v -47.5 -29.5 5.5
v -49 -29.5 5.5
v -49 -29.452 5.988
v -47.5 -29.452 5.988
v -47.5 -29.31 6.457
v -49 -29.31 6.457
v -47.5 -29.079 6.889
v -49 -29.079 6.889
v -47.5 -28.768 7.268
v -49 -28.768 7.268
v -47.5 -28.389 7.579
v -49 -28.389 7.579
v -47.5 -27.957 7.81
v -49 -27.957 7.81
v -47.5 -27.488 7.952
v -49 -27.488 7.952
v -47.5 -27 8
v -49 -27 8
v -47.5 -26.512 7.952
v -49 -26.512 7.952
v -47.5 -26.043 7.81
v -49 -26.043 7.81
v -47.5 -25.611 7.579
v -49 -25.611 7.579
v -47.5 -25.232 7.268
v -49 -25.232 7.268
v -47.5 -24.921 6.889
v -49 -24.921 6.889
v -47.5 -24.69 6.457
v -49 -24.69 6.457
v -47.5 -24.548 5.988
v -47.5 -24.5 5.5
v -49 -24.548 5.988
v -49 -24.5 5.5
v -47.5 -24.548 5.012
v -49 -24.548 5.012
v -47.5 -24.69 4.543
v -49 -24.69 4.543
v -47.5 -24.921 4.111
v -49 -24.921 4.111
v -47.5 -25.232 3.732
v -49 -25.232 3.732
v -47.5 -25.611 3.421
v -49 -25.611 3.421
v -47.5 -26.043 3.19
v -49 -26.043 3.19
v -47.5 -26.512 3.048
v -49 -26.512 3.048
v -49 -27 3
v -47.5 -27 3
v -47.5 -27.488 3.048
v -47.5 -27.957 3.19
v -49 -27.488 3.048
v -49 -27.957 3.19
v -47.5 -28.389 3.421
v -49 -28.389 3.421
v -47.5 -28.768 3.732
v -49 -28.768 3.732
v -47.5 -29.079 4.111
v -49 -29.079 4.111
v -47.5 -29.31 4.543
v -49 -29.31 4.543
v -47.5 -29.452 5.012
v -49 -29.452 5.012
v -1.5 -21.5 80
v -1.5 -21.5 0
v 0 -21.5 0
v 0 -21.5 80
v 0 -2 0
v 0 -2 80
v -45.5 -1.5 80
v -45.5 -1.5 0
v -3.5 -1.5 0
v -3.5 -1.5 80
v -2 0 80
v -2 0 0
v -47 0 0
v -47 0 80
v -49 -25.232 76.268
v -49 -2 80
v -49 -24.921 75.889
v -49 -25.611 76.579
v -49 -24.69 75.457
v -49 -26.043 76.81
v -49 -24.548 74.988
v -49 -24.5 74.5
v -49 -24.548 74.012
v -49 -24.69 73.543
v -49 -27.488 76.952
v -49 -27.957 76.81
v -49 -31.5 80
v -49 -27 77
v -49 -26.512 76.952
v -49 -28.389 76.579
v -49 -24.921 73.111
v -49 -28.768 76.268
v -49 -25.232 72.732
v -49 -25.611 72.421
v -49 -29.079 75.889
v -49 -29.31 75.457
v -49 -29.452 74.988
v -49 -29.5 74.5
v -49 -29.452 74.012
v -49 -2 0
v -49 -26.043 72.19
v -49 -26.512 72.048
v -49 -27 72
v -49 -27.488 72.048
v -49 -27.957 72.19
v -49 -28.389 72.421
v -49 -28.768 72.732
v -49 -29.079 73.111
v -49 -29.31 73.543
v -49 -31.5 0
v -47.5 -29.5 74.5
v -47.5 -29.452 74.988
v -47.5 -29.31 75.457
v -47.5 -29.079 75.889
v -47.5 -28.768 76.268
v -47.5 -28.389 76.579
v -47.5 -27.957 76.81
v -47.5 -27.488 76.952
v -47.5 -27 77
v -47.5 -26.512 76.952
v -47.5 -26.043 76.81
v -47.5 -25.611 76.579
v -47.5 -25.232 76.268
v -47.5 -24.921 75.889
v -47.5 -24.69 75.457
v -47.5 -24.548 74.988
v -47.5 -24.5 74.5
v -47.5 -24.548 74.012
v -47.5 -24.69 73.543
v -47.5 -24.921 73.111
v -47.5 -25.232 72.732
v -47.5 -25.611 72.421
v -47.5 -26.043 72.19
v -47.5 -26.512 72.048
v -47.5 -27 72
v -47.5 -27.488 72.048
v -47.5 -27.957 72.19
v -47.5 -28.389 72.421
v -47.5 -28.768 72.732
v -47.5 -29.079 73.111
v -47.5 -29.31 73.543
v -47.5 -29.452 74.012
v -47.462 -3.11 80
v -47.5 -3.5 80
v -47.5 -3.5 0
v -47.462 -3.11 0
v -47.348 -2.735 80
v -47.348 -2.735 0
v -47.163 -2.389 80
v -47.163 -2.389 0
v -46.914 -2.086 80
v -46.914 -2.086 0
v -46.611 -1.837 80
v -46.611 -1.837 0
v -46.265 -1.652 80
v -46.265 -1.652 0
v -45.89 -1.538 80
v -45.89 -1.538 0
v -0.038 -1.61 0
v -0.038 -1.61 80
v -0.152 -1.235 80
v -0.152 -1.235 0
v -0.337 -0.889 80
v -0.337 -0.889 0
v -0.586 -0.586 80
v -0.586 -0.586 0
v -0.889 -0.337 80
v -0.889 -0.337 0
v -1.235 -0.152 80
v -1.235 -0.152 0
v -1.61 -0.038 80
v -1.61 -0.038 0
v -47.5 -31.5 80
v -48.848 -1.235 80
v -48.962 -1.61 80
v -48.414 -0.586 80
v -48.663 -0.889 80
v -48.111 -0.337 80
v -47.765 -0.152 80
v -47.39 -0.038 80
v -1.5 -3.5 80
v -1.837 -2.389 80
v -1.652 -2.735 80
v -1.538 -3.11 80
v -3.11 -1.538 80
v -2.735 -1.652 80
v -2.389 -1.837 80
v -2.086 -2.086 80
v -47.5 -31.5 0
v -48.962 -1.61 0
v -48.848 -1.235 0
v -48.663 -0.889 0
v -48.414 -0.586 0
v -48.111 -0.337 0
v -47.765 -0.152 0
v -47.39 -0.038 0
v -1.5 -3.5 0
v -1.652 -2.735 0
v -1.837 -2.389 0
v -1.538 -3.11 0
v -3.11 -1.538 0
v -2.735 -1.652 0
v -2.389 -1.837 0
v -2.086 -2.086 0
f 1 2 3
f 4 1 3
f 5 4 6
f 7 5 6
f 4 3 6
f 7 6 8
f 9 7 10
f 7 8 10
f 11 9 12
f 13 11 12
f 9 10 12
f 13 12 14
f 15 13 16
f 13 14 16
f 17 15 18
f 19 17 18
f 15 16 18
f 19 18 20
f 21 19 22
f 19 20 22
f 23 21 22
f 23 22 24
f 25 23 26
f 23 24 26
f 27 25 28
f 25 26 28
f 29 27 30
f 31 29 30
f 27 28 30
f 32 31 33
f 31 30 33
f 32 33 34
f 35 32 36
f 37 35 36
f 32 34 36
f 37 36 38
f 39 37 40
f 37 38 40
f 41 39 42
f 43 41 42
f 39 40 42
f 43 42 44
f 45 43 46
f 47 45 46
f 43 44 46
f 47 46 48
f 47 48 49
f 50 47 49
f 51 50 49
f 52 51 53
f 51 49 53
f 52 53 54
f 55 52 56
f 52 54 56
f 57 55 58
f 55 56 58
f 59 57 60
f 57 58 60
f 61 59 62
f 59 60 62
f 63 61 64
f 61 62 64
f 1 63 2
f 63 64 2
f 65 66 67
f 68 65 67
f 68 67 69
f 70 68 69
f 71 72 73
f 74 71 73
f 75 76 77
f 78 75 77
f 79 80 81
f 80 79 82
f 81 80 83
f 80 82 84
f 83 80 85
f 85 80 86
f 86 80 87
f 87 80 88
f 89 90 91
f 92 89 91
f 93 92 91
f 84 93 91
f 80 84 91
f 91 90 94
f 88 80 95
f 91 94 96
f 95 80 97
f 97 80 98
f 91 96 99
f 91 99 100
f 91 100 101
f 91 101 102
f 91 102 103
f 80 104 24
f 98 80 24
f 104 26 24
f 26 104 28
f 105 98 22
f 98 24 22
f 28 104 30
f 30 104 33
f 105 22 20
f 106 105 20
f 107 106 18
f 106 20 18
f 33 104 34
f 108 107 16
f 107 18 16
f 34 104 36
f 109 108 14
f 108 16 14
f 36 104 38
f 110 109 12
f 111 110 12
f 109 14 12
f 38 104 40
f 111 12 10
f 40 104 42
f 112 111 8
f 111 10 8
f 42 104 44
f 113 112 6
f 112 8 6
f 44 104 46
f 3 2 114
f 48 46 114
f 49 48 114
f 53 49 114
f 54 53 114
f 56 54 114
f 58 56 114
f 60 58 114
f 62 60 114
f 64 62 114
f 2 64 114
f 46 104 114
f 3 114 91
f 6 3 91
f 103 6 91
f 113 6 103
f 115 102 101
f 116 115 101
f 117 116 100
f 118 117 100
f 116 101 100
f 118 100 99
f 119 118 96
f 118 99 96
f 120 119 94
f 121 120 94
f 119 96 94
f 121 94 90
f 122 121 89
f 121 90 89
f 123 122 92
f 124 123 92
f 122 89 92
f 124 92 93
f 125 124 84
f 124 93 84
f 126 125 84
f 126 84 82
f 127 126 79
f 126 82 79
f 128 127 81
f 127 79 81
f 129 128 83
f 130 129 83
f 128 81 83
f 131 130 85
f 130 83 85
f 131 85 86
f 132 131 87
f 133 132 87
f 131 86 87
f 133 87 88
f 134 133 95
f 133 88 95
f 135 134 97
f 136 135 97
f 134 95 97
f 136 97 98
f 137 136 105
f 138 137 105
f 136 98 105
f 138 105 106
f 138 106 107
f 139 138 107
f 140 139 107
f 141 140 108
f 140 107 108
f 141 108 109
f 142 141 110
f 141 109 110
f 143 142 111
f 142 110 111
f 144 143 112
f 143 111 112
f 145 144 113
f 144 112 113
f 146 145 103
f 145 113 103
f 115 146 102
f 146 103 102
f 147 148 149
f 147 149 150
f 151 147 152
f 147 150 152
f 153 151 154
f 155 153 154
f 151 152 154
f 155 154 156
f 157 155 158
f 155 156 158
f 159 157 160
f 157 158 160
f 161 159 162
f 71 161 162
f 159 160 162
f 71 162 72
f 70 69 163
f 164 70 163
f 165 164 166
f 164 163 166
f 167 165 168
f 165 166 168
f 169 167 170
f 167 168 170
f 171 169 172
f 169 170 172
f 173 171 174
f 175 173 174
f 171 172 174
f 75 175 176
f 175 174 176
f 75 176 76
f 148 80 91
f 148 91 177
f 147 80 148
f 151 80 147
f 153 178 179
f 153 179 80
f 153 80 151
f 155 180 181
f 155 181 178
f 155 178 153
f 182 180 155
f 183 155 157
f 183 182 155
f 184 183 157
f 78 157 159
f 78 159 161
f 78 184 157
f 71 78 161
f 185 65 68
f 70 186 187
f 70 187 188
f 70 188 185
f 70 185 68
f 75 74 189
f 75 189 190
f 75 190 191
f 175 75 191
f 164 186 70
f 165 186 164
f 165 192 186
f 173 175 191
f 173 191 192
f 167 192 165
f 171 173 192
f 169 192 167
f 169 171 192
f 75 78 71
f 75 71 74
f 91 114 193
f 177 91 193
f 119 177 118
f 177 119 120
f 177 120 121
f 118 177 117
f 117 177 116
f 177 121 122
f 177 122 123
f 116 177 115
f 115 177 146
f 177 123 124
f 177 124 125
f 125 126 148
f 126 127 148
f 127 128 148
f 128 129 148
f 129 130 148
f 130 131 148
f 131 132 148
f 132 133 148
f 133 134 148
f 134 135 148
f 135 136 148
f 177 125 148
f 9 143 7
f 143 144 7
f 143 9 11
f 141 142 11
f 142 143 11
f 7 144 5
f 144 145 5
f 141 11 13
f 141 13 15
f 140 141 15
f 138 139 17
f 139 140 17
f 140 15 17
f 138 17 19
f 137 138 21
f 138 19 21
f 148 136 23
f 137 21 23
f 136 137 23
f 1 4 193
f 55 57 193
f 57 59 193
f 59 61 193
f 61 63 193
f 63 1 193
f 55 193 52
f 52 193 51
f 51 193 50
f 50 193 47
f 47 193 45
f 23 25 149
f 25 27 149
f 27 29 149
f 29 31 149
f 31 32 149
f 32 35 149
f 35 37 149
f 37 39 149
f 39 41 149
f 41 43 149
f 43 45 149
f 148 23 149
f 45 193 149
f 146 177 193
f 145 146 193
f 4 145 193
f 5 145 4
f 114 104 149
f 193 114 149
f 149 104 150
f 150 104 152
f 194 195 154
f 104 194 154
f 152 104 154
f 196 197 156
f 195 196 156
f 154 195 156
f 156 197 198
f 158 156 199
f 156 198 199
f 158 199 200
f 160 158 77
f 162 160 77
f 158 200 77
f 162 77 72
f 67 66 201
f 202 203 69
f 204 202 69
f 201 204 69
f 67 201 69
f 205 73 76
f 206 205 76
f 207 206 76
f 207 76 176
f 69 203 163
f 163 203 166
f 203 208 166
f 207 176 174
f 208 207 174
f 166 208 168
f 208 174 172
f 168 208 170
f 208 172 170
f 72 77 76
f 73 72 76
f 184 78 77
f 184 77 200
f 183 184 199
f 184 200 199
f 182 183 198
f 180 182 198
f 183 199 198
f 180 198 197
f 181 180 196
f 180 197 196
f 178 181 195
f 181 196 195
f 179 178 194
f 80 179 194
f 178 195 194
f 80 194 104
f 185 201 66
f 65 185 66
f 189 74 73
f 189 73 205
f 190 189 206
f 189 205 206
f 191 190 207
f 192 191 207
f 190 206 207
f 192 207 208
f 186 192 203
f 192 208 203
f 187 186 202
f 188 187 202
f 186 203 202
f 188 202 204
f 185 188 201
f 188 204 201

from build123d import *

# Parameters (mm, degrees)
F1_DEPTH = 80
F2_R     = 2.5
F3_DEPTH = 1.5


with BuildPart() as f1:
    # F0 (on Top) → F1 (new body)
    with BuildSketch(Plane.XY):
        with BuildLine():
            ThreePointArc((0, -2), (-0.585786, -0.585786), (-2, 0))
            Line((-2, 0), (-47, 0))
            ThreePointArc((-47, 0), (-48.414214, -0.585786), (-49, -2))
            Line((-49, -2), (-49, -31.5))
            Line((-49, -31.5), (-47.5, -31.5))
            Line((-47.5, -31.5), (-47.5, -3.5))
            ThreePointArc((-47.5, -3.5), (-46.914214, -2.085786), (-45.5, -1.5))
            Line((-45.5, -1.5), (-3.5, -1.5))
            ThreePointArc((-3.5, -1.5), (-2.085786, -2.085786), (-1.5, -3.5))
            Line((-1.5, -3.5), (-1.5, -21.5))
            Line((-1.5, -21.5), (0, -21.5))
            Line((0, -21.5), (0, -2))
        make_face()
    extrude(amount=F1_DEPTH)

    # F2 (on face) → F3 (cut, through all)
    with BuildSketch(Plane(origin=(-49, 0, 0), x_dir=(0, -1, 0), z_dir=(-1, 0, 0))):
        with Locations((27, 5.5)):
            Circle(F2_R)
        with Locations((27, 74.5)):
            Circle(F2_R)
    extrude(amount=-F3_DEPTH, mode=Mode.SUBTRACT)


solid = f1.part
